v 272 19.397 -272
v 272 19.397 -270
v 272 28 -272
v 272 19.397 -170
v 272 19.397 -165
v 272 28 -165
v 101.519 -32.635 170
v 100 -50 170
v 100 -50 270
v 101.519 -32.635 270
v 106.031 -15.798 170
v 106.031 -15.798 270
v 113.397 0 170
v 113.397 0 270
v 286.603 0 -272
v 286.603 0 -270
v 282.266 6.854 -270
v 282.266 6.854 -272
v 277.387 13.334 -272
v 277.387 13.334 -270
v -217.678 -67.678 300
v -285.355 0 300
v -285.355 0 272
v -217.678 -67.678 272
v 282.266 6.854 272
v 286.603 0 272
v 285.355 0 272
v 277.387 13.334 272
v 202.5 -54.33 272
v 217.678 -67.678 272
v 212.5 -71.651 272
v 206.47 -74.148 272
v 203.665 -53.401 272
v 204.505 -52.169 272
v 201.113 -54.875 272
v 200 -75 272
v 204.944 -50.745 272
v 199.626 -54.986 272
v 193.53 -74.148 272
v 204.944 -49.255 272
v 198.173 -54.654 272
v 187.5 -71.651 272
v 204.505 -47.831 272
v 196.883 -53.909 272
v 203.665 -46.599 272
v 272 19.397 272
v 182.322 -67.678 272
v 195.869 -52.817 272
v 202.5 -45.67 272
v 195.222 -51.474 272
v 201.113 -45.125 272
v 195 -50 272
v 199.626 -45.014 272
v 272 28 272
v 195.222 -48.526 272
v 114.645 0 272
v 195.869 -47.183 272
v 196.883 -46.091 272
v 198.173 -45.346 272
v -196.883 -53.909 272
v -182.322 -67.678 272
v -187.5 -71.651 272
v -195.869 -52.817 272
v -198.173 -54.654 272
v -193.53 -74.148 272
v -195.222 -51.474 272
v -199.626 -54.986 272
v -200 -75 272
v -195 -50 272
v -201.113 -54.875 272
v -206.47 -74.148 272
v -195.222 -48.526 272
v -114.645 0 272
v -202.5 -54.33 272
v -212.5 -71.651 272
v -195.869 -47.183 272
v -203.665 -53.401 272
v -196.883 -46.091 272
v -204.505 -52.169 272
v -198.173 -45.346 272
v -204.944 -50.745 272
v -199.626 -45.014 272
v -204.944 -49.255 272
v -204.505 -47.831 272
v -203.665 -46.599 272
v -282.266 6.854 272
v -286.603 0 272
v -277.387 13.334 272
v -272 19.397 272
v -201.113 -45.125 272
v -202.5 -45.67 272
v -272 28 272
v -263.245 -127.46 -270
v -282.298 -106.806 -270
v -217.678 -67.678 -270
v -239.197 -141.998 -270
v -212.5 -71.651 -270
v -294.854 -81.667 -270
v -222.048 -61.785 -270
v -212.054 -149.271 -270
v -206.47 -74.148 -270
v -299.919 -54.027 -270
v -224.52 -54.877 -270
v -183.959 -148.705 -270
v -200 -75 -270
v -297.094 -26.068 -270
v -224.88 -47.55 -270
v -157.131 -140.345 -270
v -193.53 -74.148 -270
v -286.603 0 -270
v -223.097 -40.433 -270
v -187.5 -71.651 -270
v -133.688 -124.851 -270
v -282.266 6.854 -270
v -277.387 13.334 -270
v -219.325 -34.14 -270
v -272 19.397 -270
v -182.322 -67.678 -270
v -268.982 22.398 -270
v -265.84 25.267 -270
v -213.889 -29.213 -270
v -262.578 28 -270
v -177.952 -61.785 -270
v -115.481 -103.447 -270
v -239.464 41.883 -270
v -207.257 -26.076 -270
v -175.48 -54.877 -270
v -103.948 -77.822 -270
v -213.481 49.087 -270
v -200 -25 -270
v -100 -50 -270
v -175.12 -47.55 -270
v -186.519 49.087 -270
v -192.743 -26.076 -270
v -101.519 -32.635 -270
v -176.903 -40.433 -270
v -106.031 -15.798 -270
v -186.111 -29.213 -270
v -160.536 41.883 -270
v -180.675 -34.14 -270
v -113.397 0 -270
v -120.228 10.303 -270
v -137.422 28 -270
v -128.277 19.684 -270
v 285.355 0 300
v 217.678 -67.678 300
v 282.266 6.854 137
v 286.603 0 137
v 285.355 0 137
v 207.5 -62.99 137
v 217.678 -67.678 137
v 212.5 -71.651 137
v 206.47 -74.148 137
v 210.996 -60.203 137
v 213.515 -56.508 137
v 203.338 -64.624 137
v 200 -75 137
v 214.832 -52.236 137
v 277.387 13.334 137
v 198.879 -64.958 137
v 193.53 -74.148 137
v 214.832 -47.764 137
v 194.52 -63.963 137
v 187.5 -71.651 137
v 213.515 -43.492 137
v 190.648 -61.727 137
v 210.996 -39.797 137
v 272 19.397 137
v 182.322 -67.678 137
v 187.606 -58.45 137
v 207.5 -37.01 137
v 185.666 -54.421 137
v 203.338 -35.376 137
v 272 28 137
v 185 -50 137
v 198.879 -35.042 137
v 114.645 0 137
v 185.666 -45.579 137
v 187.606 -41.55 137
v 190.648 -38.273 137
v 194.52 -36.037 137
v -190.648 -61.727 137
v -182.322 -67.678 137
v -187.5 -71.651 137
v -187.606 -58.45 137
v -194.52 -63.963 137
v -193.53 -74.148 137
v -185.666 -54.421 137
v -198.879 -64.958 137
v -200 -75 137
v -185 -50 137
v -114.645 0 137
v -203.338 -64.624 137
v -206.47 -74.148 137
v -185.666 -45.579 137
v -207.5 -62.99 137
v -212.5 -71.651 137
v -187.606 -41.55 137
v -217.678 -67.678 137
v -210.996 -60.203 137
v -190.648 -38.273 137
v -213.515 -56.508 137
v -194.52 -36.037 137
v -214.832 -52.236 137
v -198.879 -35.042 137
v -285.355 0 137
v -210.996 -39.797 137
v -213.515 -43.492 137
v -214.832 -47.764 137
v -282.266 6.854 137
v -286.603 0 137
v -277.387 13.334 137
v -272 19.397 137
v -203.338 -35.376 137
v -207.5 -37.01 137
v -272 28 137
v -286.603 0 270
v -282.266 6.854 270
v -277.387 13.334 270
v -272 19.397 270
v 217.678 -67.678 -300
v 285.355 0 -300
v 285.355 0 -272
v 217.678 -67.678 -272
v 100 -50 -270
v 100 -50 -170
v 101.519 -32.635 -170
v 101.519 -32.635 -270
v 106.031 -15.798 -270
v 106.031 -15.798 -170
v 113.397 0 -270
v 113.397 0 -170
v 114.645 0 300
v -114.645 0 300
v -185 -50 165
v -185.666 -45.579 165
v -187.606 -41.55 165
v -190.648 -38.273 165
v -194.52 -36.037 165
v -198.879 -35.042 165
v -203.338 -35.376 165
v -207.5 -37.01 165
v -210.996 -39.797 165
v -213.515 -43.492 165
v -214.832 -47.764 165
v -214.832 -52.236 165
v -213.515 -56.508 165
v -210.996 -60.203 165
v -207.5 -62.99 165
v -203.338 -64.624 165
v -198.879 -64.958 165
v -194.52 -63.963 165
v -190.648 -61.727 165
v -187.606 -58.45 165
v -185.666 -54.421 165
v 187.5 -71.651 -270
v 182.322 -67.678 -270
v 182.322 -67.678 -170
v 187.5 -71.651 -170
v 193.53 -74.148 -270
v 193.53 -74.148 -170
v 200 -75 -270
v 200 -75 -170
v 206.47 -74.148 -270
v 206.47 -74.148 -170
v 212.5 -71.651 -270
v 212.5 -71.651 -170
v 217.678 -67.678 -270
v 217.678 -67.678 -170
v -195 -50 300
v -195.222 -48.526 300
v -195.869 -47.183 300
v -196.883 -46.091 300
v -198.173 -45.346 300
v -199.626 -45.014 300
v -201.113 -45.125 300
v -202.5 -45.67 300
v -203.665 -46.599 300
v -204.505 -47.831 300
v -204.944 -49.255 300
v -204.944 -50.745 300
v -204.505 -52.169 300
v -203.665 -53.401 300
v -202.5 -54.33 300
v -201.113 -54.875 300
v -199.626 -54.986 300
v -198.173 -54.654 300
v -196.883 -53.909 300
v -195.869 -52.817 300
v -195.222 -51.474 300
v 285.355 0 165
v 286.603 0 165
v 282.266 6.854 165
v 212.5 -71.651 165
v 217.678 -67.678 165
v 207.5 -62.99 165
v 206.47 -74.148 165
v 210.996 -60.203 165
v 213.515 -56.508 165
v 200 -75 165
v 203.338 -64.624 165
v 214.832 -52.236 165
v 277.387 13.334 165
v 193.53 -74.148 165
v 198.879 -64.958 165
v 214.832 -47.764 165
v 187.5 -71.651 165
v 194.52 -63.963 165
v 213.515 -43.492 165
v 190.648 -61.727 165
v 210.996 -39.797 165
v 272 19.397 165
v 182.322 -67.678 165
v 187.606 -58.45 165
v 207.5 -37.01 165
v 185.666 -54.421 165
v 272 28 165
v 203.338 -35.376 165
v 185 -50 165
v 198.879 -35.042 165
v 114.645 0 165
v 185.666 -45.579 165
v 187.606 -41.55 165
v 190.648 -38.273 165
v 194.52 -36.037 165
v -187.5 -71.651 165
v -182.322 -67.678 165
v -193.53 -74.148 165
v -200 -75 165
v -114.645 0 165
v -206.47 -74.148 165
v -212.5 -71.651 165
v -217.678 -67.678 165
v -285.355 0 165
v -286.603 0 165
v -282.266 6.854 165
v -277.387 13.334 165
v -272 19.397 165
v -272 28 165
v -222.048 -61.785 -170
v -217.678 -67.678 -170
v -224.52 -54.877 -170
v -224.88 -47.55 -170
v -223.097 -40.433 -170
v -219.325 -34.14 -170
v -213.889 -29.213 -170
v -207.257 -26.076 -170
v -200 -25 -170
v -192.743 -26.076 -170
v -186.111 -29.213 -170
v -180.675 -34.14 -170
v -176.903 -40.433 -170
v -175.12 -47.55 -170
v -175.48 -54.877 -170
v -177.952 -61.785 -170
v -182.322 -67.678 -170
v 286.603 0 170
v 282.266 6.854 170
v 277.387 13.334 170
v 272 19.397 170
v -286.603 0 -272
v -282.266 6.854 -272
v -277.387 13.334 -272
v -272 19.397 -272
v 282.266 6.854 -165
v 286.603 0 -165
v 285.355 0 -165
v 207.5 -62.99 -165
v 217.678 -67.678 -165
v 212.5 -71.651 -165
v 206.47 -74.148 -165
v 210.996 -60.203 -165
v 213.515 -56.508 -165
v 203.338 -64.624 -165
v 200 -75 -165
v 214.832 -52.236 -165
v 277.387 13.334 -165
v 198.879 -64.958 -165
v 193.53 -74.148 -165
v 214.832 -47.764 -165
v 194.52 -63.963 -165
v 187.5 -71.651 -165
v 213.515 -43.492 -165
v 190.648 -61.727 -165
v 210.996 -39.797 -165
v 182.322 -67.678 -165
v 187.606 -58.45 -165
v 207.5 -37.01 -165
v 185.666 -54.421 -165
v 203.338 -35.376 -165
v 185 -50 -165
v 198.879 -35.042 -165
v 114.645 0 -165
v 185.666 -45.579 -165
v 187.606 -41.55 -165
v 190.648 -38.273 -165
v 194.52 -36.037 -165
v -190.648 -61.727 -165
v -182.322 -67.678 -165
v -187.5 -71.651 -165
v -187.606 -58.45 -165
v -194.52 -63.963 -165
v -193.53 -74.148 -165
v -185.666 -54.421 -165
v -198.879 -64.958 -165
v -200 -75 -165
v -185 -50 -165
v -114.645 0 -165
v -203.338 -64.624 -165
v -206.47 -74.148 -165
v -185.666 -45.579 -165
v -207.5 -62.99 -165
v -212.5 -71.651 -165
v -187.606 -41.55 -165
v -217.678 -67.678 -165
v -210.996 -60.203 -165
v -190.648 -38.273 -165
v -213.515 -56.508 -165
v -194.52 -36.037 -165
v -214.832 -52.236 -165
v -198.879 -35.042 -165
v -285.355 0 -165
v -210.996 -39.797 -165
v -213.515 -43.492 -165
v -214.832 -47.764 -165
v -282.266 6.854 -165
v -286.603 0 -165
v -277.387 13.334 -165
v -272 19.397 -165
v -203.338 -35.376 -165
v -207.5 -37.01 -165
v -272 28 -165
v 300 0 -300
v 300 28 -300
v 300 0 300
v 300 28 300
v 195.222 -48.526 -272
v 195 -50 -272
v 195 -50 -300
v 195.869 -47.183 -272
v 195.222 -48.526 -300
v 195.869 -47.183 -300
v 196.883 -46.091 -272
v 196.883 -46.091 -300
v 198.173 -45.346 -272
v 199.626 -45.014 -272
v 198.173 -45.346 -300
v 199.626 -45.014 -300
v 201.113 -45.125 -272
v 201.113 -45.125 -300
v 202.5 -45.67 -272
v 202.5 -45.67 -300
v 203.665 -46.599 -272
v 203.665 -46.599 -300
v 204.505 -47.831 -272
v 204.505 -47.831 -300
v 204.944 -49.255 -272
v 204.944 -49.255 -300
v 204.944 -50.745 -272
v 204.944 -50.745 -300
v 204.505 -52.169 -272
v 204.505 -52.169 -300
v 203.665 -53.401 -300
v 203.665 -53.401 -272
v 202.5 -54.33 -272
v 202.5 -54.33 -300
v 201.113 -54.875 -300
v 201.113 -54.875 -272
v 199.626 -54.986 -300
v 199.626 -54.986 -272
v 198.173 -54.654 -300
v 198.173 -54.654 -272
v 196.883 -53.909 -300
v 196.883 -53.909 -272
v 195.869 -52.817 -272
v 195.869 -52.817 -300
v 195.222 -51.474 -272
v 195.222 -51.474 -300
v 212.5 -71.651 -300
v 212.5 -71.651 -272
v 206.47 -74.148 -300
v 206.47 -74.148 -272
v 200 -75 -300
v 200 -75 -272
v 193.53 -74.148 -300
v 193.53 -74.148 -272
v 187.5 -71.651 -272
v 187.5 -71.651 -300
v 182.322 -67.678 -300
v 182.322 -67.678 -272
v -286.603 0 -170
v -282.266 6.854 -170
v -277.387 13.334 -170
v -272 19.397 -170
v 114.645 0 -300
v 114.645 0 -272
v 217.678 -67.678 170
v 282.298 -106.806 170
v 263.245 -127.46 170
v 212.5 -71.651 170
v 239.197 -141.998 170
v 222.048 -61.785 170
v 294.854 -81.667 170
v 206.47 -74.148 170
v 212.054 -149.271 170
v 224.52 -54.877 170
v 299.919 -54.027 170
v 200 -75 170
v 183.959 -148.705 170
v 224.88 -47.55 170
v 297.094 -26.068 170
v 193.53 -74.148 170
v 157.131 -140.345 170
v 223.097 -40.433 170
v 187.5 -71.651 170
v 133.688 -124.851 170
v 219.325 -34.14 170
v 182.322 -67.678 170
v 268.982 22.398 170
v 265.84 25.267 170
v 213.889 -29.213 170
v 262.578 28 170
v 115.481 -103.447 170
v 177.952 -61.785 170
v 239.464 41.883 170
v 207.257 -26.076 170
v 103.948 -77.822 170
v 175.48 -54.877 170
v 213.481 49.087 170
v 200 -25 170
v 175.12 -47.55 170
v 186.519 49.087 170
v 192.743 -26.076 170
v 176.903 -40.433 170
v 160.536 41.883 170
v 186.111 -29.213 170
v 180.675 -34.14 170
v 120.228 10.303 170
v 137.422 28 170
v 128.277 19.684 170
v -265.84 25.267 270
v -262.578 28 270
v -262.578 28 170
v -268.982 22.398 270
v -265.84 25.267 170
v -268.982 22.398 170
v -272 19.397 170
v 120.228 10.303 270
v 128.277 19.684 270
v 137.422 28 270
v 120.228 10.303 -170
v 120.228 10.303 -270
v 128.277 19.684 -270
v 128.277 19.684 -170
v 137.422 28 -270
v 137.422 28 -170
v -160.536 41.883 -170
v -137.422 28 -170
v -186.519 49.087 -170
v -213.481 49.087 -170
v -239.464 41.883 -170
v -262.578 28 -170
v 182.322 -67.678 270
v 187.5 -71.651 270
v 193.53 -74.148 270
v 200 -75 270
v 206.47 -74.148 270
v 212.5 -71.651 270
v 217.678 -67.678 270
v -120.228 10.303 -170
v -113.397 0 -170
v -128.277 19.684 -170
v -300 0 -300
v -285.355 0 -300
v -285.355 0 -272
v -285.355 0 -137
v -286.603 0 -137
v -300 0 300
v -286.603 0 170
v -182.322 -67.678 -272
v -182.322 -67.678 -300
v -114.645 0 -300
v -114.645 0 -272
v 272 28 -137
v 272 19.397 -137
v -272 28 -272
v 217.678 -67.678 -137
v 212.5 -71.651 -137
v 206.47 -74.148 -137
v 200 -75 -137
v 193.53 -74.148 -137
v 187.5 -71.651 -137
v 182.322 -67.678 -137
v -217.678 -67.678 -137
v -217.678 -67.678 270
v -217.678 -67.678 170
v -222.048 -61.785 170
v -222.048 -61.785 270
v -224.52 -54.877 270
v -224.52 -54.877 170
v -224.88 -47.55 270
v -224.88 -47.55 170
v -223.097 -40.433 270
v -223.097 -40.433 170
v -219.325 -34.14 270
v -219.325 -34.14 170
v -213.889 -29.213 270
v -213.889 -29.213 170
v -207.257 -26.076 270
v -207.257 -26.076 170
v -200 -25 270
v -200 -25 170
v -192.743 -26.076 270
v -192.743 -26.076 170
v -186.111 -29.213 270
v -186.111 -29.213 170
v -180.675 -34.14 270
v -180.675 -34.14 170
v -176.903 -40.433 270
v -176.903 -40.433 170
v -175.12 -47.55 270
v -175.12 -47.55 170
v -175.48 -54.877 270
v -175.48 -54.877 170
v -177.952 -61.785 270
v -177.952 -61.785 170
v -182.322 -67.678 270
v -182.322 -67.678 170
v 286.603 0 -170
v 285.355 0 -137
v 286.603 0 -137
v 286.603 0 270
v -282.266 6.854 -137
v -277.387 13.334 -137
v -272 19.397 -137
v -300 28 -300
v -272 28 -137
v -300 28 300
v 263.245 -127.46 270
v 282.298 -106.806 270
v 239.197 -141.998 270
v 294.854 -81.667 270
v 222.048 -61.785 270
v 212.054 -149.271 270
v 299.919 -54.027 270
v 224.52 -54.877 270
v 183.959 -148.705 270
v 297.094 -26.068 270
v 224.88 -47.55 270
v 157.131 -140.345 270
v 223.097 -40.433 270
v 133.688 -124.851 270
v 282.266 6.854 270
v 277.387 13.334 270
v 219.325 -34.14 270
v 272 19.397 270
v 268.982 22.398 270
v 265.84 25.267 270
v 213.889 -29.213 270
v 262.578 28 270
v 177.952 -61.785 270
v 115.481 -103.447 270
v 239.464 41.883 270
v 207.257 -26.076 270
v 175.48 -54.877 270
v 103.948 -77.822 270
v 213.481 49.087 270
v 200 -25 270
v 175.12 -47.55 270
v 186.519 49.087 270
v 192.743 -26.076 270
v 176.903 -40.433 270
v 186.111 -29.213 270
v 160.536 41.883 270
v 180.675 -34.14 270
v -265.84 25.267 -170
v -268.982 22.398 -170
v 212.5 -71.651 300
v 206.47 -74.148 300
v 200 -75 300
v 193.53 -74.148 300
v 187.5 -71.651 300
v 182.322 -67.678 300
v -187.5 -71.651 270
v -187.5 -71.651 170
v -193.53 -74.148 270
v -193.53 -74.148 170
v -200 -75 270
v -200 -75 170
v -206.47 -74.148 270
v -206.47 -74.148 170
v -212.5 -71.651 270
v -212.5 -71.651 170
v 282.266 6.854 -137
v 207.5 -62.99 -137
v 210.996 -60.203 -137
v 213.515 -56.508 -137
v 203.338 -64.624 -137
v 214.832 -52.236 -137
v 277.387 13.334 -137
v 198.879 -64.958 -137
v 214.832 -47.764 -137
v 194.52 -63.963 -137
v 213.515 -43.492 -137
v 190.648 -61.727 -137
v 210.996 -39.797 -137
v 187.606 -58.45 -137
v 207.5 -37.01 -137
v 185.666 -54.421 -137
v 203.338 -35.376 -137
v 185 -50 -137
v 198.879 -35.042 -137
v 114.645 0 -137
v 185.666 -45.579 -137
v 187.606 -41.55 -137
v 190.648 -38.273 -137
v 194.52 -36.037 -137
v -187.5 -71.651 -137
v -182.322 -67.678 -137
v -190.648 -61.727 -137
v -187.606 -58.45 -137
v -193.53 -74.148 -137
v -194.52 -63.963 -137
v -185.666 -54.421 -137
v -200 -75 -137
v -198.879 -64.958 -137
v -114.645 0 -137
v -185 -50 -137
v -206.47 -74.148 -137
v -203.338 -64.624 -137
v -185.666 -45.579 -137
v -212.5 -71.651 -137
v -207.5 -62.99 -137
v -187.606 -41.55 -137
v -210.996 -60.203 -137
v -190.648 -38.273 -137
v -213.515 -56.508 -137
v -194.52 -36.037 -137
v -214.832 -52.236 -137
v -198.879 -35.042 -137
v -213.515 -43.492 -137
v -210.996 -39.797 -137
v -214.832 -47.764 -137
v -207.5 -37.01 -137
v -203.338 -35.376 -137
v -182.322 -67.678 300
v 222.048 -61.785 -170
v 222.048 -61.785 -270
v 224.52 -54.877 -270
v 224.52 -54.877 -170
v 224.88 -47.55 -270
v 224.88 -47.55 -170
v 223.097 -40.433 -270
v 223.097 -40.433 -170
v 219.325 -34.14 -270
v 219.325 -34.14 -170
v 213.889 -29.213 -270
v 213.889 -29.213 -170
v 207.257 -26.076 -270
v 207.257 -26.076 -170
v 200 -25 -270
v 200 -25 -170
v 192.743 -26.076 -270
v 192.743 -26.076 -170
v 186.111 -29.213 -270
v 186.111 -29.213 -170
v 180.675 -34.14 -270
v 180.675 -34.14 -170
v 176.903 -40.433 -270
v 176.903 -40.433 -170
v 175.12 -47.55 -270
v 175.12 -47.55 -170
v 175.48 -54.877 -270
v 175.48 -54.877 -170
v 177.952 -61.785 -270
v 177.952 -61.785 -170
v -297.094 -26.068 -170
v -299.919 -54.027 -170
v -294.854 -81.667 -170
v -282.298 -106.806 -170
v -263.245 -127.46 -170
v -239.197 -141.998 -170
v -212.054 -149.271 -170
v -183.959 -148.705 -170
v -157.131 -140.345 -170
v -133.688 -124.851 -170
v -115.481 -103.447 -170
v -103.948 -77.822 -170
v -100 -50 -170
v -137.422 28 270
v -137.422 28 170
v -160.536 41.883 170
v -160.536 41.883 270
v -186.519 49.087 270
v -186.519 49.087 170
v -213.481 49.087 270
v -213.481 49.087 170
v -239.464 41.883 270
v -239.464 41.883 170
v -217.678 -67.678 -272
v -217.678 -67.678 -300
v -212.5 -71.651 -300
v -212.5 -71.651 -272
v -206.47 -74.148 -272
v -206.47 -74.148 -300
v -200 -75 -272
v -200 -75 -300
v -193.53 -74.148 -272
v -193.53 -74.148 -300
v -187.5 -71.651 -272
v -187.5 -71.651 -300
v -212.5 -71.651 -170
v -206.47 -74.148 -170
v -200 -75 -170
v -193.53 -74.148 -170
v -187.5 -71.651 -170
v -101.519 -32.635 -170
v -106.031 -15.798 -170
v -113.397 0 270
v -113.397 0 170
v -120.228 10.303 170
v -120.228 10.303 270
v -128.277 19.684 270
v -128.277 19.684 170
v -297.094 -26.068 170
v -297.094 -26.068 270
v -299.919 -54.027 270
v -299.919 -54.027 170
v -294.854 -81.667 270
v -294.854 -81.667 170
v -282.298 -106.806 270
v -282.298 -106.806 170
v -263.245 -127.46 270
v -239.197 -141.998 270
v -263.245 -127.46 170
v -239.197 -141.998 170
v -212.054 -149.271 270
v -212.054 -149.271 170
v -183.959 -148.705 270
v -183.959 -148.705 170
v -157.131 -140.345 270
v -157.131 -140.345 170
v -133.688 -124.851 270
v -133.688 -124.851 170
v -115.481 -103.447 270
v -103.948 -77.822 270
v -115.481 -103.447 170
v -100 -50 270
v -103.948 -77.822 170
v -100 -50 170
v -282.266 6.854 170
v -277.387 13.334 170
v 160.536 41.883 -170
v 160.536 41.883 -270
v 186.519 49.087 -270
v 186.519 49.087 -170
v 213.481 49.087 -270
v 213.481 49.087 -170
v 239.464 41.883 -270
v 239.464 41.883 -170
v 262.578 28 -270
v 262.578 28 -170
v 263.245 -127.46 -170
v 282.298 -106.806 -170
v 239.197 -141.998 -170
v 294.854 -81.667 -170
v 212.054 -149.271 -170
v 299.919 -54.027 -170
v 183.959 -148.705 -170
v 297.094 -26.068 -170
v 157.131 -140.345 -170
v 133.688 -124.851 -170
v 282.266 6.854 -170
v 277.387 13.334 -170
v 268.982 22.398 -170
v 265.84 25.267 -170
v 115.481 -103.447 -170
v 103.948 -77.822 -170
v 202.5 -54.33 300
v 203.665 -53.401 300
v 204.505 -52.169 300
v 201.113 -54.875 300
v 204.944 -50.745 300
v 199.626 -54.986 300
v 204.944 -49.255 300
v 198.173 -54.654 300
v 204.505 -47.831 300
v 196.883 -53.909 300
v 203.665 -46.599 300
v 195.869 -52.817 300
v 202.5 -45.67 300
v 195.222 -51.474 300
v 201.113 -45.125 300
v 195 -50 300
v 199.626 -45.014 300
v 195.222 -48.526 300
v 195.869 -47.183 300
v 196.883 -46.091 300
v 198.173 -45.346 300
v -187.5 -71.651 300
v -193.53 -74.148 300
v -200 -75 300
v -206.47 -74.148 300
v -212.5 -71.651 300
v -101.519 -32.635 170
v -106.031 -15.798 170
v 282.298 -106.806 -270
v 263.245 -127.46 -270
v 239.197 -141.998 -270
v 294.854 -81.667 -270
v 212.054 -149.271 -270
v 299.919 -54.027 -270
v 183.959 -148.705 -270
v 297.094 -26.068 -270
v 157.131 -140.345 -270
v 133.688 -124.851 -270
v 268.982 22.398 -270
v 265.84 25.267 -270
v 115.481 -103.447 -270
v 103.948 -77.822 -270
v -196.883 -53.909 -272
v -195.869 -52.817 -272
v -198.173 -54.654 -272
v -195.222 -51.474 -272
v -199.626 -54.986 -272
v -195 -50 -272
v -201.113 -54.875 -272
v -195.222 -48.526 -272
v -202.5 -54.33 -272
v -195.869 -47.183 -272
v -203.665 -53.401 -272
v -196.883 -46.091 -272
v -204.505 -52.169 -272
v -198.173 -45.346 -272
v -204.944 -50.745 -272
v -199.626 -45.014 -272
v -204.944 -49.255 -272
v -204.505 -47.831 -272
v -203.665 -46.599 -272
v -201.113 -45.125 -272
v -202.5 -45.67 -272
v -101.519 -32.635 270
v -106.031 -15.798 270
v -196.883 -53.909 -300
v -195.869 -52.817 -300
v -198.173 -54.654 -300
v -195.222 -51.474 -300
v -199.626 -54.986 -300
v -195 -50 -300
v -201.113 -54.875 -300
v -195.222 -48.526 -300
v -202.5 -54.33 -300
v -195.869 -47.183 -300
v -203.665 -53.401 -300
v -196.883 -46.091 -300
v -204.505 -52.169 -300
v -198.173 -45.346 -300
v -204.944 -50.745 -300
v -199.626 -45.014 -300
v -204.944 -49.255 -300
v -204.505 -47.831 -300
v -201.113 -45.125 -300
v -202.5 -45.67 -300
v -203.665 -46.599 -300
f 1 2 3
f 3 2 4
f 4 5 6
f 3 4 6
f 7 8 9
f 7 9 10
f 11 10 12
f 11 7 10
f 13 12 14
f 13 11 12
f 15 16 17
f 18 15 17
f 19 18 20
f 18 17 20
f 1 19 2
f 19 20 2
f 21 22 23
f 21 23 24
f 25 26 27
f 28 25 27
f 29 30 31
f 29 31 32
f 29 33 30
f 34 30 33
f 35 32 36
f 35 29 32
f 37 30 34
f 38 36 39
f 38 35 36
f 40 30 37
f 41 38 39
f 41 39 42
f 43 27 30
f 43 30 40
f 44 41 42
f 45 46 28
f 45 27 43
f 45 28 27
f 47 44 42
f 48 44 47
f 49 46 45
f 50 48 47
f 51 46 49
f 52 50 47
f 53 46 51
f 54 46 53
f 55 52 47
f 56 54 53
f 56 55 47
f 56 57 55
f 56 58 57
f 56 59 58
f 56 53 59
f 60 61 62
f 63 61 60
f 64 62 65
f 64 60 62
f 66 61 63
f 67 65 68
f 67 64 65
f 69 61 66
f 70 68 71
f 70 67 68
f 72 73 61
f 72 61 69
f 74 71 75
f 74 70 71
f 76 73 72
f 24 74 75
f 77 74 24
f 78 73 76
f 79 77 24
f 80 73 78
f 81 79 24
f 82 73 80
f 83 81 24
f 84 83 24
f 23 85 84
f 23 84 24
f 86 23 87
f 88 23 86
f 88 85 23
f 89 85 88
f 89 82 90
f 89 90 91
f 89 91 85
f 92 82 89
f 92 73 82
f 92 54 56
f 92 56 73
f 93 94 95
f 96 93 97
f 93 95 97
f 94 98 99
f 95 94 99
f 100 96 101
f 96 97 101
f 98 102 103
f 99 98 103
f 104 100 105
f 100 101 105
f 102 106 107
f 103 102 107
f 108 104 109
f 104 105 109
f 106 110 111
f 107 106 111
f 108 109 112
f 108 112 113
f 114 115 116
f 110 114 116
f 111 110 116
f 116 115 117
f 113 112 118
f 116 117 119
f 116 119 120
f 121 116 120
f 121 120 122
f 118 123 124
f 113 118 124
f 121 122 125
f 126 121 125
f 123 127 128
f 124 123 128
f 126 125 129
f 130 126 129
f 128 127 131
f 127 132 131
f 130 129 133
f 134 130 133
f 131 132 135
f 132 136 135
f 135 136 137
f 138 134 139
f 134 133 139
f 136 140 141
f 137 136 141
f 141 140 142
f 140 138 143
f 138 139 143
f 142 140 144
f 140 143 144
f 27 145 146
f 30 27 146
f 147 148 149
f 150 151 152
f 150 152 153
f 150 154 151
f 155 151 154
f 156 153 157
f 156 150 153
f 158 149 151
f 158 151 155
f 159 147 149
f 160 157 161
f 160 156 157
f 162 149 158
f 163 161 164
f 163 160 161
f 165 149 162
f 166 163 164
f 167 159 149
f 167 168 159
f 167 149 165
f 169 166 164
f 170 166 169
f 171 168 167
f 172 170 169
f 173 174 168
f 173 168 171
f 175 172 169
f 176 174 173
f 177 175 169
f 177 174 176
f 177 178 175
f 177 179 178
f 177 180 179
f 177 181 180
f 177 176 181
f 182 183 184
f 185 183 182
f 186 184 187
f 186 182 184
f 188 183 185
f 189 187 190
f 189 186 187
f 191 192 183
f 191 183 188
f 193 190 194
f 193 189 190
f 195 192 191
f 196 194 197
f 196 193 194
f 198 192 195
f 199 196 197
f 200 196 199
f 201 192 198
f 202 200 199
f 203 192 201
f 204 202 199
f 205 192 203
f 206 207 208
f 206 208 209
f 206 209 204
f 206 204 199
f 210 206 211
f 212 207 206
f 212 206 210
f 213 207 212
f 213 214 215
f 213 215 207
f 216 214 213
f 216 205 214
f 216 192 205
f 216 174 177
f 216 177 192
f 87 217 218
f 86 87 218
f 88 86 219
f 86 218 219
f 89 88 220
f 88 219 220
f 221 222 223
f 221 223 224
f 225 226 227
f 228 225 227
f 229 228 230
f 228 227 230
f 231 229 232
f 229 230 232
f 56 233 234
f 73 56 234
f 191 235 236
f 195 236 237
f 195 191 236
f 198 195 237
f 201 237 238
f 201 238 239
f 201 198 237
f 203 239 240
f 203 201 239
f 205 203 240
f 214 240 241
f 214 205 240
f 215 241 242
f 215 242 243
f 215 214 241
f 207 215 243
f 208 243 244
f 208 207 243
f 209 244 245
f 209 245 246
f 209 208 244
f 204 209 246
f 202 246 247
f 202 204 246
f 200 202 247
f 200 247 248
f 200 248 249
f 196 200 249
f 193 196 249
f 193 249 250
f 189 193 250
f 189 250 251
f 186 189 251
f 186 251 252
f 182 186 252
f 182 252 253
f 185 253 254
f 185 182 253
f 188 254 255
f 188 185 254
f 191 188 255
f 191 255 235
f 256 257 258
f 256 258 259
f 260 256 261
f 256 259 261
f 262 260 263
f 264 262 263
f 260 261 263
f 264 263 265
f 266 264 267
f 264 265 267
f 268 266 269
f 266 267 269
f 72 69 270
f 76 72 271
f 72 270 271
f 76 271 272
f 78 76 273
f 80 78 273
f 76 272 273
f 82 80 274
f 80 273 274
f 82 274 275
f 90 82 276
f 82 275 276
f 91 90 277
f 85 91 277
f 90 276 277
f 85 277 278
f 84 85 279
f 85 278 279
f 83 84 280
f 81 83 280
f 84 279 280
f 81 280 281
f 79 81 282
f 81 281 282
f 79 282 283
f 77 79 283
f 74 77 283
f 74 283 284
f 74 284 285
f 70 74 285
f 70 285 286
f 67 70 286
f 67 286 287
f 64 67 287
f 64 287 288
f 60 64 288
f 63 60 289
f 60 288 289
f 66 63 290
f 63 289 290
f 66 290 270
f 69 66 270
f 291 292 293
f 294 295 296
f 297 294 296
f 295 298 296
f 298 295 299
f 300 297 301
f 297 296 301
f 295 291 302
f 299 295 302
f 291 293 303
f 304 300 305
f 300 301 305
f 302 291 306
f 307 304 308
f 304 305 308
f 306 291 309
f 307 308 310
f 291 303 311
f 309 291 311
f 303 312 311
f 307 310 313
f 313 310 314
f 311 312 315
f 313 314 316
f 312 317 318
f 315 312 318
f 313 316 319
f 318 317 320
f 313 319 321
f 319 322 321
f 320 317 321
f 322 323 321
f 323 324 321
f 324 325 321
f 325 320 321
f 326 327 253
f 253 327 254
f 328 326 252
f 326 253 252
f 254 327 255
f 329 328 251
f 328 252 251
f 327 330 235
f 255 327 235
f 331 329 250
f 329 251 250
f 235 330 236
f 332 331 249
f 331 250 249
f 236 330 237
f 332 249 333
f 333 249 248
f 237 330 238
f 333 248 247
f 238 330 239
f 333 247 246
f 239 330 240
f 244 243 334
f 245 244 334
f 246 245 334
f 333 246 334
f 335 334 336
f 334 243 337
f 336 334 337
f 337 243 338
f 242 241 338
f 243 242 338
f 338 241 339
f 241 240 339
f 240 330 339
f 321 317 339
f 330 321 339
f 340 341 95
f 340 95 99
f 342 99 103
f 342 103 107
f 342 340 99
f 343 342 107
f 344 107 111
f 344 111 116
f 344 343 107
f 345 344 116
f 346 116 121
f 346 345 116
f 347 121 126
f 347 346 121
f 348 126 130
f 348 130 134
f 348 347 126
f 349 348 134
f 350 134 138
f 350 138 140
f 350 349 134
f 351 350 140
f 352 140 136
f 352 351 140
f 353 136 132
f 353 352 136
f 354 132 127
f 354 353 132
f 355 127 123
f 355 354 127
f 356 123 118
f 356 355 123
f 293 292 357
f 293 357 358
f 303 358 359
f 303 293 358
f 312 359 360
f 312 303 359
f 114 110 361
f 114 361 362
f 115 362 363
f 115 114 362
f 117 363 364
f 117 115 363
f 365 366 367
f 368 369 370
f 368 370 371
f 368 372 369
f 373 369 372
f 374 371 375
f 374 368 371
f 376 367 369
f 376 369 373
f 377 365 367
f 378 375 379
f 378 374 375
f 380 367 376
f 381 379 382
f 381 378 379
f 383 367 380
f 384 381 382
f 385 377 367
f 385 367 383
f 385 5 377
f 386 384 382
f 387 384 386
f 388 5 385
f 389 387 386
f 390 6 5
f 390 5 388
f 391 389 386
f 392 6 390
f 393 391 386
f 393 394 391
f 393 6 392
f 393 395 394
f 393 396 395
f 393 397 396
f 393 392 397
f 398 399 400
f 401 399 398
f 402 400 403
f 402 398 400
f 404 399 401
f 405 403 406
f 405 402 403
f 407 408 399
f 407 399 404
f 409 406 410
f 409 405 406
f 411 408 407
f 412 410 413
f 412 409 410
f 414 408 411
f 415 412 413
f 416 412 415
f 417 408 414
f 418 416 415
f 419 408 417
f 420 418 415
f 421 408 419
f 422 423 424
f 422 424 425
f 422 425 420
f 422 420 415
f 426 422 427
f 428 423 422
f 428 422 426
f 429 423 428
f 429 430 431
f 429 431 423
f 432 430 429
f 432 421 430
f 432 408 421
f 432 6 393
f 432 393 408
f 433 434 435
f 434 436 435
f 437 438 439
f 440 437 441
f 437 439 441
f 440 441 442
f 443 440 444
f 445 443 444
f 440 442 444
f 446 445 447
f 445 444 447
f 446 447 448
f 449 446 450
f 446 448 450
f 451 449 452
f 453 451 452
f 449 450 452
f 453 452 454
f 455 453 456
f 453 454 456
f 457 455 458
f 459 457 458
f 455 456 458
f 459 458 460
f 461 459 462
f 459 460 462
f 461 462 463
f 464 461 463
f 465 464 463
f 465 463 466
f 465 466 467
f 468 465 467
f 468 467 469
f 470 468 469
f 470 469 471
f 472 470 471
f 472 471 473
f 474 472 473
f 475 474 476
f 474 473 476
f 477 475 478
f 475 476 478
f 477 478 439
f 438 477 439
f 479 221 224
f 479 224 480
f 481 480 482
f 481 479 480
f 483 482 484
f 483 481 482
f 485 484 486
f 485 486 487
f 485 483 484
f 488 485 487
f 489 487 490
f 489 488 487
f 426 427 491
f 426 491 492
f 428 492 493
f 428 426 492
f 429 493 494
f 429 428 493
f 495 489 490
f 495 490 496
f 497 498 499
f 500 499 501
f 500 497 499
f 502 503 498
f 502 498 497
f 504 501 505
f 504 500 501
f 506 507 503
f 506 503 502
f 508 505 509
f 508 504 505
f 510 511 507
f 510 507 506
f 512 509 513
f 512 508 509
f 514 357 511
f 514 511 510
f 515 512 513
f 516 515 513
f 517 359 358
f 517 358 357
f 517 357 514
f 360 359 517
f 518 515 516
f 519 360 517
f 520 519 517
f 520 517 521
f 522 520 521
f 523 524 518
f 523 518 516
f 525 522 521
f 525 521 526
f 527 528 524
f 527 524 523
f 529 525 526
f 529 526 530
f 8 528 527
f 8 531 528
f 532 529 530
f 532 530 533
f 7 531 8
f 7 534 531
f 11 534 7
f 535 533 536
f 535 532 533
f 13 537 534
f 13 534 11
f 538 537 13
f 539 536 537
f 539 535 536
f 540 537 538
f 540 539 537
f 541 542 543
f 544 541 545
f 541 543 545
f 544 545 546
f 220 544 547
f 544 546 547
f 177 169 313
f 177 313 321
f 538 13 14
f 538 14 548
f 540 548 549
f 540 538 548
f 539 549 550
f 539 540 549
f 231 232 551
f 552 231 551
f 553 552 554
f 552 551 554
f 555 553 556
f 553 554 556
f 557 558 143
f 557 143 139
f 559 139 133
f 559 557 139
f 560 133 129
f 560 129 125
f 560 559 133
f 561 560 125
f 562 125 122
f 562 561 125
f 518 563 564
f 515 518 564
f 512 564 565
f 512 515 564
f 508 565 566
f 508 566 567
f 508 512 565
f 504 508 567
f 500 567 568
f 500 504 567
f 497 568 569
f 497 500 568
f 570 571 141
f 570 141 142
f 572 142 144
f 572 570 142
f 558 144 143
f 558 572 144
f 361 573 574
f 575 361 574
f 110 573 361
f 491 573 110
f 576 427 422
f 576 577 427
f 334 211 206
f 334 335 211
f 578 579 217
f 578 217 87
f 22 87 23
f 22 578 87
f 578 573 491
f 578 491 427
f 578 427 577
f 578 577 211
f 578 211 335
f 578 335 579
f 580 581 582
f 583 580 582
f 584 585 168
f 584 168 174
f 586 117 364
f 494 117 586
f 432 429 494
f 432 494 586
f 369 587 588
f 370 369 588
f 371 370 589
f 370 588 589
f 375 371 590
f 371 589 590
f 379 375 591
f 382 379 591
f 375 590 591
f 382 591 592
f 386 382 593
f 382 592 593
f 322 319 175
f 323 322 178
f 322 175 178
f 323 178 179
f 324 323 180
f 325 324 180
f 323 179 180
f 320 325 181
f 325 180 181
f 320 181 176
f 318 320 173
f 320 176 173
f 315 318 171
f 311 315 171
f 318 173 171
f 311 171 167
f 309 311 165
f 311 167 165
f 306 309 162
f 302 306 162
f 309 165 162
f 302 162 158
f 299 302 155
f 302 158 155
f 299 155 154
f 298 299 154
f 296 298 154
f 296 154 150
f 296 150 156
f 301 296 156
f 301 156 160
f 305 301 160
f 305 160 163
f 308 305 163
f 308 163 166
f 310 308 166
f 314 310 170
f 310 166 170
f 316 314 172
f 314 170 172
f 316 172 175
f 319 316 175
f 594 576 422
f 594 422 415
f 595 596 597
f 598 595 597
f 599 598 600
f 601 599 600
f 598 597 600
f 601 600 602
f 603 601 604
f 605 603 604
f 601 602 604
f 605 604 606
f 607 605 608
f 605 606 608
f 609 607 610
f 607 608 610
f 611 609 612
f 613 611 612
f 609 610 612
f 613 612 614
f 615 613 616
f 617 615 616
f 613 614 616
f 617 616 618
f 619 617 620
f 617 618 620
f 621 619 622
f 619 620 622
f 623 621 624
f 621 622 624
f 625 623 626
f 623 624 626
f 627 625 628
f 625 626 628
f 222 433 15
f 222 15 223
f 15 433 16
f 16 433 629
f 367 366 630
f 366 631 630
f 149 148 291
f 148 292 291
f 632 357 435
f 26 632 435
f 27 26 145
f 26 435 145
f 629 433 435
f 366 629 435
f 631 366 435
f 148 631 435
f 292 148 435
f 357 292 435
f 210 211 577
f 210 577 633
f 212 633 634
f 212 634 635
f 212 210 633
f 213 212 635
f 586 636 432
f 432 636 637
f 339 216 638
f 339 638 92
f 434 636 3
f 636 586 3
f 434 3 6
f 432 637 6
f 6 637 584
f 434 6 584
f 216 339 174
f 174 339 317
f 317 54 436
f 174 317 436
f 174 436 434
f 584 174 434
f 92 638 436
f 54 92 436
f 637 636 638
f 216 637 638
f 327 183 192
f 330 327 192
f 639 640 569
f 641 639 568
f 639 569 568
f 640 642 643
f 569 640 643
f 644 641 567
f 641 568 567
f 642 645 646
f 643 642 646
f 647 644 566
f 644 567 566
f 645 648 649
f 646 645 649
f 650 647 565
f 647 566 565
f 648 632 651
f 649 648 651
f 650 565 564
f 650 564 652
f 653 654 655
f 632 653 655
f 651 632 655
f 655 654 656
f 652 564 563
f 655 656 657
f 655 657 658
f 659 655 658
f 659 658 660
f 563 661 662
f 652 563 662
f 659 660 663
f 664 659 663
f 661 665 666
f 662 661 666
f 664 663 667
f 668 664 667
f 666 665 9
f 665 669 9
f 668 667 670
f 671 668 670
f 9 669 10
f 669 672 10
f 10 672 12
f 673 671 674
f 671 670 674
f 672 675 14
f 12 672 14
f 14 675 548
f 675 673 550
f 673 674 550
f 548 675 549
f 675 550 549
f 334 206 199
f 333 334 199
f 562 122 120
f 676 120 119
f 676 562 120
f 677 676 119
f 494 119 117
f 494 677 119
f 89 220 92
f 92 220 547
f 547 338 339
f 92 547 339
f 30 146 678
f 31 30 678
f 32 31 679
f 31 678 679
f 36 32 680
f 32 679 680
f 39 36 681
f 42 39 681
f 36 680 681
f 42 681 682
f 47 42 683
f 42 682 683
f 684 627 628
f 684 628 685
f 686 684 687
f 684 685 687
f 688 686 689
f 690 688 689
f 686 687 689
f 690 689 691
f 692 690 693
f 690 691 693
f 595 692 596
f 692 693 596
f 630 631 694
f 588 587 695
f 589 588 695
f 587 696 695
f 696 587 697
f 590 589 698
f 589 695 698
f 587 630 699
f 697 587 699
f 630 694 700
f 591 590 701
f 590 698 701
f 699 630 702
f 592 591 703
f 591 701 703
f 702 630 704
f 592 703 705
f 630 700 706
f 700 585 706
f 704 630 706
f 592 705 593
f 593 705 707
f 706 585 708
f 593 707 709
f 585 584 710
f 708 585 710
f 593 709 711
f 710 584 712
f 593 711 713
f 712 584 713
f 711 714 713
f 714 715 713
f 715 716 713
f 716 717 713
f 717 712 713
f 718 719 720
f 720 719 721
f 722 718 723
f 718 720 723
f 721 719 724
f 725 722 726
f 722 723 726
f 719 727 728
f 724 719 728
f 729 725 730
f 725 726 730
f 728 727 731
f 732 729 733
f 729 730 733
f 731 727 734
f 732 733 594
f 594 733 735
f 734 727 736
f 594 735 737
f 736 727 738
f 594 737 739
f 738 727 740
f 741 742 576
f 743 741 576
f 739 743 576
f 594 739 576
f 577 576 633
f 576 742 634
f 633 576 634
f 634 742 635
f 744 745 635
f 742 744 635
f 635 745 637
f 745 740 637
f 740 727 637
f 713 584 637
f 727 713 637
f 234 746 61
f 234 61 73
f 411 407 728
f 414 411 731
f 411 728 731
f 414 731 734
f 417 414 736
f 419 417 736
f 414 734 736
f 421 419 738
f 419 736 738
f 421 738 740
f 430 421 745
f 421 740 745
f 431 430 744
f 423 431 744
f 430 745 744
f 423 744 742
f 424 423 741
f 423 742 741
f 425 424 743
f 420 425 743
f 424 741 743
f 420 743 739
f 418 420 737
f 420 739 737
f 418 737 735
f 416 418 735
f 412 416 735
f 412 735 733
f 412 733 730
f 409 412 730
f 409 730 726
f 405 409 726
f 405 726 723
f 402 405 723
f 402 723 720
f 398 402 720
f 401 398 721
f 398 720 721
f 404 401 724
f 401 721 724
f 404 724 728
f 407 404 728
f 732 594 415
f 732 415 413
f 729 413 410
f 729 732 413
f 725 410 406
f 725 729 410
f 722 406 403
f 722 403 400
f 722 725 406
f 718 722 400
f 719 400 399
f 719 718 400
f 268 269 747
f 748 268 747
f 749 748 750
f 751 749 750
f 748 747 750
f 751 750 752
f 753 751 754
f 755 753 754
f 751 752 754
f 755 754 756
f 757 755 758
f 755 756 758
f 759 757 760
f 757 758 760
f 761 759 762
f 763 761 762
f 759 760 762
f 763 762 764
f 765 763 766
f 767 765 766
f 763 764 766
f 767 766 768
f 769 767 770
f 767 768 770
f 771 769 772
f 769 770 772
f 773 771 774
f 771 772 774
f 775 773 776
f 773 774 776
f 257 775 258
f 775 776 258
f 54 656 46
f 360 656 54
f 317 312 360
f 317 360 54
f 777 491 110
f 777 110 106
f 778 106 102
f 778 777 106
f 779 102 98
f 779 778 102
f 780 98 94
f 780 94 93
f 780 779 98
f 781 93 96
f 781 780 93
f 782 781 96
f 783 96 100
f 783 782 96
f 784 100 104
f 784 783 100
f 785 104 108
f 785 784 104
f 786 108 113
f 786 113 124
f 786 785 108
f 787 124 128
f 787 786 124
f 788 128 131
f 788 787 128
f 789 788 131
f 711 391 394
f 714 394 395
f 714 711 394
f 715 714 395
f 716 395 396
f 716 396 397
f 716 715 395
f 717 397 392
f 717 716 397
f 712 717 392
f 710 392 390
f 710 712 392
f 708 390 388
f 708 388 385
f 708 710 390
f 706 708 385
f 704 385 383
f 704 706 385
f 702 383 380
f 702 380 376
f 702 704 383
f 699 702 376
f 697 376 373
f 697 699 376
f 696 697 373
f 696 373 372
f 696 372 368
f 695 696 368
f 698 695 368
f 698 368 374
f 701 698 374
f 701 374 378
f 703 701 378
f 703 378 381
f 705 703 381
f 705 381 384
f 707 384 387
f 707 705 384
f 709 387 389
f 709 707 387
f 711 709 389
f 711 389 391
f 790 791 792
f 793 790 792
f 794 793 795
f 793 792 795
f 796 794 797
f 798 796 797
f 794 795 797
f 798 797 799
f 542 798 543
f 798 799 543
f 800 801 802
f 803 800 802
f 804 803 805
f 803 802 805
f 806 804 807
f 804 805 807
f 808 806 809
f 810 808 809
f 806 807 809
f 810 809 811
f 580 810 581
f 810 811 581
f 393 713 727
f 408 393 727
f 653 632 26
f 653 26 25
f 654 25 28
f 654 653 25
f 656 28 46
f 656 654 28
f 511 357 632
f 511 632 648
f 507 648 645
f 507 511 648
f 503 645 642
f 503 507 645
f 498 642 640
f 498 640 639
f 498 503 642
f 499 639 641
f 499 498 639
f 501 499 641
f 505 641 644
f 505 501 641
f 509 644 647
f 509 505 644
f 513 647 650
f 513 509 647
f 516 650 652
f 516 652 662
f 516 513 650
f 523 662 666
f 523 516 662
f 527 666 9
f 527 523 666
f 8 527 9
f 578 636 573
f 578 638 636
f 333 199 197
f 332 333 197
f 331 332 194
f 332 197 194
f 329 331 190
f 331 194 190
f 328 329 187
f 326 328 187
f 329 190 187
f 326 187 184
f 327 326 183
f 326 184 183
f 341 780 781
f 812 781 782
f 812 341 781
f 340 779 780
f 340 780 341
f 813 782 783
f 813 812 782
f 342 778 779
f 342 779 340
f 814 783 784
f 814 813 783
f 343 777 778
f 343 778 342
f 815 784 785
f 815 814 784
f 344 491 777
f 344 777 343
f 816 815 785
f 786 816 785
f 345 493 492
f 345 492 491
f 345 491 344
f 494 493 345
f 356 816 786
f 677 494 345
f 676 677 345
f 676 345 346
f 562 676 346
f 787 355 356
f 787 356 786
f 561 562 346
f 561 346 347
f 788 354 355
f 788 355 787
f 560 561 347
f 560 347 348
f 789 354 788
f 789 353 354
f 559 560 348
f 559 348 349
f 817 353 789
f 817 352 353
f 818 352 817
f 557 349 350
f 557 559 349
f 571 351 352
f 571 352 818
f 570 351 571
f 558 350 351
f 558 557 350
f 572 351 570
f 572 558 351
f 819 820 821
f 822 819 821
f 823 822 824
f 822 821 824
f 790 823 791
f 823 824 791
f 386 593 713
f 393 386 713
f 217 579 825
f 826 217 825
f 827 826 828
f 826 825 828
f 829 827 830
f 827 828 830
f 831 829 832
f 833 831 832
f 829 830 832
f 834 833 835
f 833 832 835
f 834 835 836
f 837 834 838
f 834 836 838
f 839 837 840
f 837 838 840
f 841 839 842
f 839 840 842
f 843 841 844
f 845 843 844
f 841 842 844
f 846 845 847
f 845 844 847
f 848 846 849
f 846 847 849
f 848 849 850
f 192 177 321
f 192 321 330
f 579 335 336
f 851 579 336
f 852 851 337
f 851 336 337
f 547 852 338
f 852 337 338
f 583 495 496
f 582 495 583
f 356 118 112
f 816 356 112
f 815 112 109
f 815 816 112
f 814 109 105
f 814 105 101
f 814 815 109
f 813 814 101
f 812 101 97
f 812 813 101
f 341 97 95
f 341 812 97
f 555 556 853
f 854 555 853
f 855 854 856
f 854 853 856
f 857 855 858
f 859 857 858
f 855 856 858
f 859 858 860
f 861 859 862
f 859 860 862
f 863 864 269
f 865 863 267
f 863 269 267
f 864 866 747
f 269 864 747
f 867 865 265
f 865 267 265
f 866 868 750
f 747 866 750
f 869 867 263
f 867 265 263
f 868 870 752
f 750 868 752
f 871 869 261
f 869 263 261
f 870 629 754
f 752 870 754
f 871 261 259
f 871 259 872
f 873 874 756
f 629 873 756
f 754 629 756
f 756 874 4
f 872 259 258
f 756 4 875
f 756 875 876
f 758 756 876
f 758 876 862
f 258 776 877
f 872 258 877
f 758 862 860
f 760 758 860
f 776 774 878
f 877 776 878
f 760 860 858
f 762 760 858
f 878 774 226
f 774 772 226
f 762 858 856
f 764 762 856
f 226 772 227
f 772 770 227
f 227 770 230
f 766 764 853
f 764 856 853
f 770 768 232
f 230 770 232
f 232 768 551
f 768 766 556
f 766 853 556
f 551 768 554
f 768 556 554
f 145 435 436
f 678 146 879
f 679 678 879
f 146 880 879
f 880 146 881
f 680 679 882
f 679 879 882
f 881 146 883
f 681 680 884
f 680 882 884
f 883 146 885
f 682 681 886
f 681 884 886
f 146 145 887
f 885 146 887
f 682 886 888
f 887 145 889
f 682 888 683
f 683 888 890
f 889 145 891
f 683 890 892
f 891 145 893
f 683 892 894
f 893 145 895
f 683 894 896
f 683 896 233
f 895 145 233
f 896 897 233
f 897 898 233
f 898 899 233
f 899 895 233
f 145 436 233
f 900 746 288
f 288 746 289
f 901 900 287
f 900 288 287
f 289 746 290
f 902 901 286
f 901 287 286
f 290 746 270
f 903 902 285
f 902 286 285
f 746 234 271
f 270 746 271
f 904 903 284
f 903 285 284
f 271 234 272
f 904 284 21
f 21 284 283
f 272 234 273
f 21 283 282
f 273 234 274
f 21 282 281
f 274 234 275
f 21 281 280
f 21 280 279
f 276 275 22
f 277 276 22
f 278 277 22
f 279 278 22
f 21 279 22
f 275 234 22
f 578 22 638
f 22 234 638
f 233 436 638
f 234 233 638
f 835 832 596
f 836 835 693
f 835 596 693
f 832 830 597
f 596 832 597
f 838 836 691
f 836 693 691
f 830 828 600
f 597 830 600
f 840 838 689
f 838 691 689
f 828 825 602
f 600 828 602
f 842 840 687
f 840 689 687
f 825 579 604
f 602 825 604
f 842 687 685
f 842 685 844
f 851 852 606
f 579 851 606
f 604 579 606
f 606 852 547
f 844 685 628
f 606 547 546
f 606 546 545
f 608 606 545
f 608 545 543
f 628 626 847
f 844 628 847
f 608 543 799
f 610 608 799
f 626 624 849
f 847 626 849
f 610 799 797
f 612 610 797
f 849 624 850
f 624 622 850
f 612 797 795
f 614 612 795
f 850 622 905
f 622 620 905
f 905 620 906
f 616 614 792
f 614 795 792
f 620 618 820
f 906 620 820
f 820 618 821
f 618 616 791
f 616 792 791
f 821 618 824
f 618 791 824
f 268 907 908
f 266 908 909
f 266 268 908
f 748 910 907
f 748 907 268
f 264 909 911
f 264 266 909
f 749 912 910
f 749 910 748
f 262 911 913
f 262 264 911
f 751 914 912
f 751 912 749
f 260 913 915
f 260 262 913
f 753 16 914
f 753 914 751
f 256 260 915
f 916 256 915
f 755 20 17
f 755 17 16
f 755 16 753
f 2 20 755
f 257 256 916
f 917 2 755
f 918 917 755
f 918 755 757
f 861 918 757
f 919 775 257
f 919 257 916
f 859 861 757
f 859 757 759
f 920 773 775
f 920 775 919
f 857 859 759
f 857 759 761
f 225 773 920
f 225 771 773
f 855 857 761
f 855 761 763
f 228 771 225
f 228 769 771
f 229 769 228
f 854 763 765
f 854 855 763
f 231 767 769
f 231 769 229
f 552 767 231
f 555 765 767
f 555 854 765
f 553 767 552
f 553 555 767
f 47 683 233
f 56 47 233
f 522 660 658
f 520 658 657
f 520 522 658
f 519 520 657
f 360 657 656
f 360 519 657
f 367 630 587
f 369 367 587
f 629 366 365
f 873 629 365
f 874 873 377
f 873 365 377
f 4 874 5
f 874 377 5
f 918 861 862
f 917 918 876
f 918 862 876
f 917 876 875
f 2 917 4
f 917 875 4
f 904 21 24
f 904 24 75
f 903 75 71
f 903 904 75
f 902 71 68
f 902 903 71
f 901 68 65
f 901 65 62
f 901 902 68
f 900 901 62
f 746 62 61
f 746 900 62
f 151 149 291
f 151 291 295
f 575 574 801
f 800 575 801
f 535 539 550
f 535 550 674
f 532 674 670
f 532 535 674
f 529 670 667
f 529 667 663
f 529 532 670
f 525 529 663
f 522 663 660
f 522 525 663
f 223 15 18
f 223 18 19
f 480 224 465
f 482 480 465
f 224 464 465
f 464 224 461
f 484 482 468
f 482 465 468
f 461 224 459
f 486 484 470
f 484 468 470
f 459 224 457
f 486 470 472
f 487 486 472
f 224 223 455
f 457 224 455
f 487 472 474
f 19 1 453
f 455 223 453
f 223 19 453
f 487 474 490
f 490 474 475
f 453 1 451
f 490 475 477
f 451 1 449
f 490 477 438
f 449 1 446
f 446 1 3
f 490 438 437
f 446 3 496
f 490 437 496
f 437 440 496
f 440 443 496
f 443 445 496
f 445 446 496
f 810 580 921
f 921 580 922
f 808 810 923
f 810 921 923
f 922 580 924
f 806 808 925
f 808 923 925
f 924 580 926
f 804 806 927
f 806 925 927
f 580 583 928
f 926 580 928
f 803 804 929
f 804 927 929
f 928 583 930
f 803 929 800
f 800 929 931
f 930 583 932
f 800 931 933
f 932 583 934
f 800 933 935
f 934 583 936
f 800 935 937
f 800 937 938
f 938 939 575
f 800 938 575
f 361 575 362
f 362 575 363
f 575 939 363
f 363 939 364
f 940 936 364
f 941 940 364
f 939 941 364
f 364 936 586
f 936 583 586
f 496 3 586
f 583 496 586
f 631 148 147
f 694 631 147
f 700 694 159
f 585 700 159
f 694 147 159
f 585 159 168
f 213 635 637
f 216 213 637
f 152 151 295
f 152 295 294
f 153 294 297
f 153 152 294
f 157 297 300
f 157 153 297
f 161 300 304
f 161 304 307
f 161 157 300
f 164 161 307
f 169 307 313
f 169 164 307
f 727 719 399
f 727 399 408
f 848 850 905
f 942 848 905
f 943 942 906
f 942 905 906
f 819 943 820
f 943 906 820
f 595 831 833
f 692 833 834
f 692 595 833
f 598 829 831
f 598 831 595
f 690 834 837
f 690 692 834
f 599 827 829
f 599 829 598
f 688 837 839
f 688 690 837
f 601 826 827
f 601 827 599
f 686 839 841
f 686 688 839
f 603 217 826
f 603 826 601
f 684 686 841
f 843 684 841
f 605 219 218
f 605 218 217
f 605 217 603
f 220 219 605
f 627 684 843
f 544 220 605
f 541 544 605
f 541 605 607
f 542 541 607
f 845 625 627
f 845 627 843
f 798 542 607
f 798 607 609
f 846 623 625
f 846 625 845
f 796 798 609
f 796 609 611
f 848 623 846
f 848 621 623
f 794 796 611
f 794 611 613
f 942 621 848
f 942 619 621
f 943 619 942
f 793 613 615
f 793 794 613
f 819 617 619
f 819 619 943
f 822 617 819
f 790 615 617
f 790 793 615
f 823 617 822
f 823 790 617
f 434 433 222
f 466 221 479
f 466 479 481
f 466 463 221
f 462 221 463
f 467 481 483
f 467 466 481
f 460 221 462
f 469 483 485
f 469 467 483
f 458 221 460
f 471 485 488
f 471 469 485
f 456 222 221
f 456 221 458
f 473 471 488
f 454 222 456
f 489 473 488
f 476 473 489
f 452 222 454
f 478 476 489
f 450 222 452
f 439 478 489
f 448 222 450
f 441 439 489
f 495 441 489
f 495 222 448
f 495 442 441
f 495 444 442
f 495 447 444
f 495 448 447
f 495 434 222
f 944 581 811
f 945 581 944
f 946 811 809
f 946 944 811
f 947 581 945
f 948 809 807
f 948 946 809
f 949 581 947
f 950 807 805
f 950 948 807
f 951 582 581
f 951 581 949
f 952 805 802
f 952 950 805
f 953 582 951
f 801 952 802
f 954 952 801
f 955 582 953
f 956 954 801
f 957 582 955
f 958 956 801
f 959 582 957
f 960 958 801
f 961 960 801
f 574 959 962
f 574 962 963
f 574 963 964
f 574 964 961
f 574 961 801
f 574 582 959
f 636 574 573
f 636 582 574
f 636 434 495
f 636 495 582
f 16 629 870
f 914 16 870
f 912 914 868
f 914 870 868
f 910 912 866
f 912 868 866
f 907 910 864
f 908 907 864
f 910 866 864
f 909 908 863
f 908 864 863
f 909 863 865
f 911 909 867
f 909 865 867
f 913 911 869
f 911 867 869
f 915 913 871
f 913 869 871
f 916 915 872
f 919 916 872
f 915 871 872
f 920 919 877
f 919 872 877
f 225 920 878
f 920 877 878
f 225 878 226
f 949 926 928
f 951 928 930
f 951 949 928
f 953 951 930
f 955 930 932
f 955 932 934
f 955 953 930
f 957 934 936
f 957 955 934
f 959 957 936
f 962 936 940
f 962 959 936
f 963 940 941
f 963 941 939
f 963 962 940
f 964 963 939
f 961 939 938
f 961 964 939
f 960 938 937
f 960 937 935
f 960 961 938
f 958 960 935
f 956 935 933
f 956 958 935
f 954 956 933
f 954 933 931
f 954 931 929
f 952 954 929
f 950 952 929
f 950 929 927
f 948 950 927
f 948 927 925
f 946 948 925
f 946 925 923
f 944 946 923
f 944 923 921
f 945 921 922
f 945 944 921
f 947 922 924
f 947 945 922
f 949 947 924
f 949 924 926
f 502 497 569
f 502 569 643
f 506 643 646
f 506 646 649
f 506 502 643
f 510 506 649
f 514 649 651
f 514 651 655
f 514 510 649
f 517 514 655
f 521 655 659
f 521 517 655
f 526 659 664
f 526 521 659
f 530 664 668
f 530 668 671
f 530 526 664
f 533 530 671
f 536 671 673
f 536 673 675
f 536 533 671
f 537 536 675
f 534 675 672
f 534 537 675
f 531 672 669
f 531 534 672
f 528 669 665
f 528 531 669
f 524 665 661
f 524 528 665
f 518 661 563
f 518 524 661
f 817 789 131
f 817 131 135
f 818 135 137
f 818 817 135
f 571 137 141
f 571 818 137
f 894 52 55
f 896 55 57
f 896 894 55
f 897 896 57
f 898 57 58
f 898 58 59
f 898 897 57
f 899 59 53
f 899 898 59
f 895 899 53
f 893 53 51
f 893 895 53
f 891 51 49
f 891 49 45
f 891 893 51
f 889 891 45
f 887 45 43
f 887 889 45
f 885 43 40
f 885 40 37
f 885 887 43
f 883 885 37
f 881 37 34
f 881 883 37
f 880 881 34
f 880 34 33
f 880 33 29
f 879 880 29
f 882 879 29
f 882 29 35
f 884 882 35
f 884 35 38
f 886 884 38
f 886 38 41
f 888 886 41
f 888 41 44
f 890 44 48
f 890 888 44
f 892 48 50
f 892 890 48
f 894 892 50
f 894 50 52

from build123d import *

# Parameters (mm, degrees)
BOSS_EXTRUDE1_START = 300
SKETCH1_R           = 5
BOSS_EXTRUDE1_DEPTH = 28
BOSS_EXTRUDE2_DEPTH = 300
BOSS_EXTRUDE3_START = 270
SKETCH1_5_R         = 100
SKETCH1_5_R_2       = 25
BOSS_EXTRUDE3_DEPTH = 100
BOSS_EXTRUDE4_START = 165
SKETCH1_6_R         = 15
BOSS_EXTRUDE4_DEPTH = 28


with BuildPart() as part:
    # Sketch1 → Boss-Extrude1 (new body)
    with BuildSketch(Plane.XY.offset(BOSS_EXTRUDE1_START)):
        with BuildLine():
            Line((-182.32233047, -67.67766953), (-114.644660941, 0))
            Line((-114.644660941, 0), (0, 0))
            Line((0, 0), (0, 28))
            Line((0, 28), (-300, 28))
            Line((-300, 28), (-300, 0))
            Line((-300, 0), (-285.355339059, 0))
            Line((-285.355339059, 0), (-217.67766953, -67.67766953))
            ThreePointArc((-217.67766953, -67.67766953), (-200, -75), (-182.32233047, -67.67766953))
        make_face()
        with Locations((-200, -50)):
            Circle(SKETCH1_R, mode=Mode.SUBTRACT)
    extrude(amount=-BOSS_EXTRUDE1_DEPTH)

    # Sketch1<4> → Boss-Extrude2 (add)
    with BuildSketch(Plane.XY):
        with BuildLine():
            ThreePointArc((-286.602540378, 0), (-279.89215416, 10.143525867), (-272, 19.397406292))
            Line((-272, 19.397406292), (-272, 28))
            Line((-272, 28), (-300, 28))
            Line((-300, 28), (-300, 0))
            Line((-300, 0), (-286.602540378, 0))
        make_face()
    extrude(amount=BOSS_EXTRUDE2_DEPTH)

    # Sketch1<5> → Boss-Extrude3 (add)
    with BuildSketch(Plane.XY.offset(BOSS_EXTRUDE3_START)):
        with Locations((-200, -50)):
            Circle(SKETCH1_5_R)
        with Locations((-200, -50)):
            Circle(SKETCH1_5_R_2, mode=Mode.SUBTRACT)
    extrude(amount=-BOSS_EXTRUDE3_DEPTH)

    # Sketch1<6> → Boss-Extrude4 (add)
    with BuildSketch(Plane.XY.offset(BOSS_EXTRUDE4_START)):
        with BuildLine():
            Line((-182.32233047, -67.67766953), (-114.644660941, 0))
            Line((-114.644660941, 0), (0, 0))
            Line((0, 0), (0, 28))
            Line((0, 28), (-300, 28))
            Line((-300, 28), (-300, 0))
            Line((-300, 0), (-285.355339059, 0))
            Line((-285.355339059, 0), (-217.67766953, -67.67766953))
            ThreePointArc((-217.67766953, -67.67766953), (-200, -75), (-182.32233047, -67.67766953))
        make_face()
        with Locations((-200, -50)):
            Circle(SKETCH1_6_R, mode=Mode.SUBTRACT)
    extrude(amount=-BOSS_EXTRUDE4_DEPTH)

    # Mirror1: part across plane


with BuildPart() as part_1:
    add(part.part)
    add(part.part.mirror(Plane.XY))

    # Mirror2: part across plane


with BuildPart() as part_2:
    add(part_1.part)
    add(part_1.part.mirror(Plane(origin=(0, 0, 0), x_dir=(0, 0, 1), z_dir=(1, 0, 0))))


solid = part_2.part
